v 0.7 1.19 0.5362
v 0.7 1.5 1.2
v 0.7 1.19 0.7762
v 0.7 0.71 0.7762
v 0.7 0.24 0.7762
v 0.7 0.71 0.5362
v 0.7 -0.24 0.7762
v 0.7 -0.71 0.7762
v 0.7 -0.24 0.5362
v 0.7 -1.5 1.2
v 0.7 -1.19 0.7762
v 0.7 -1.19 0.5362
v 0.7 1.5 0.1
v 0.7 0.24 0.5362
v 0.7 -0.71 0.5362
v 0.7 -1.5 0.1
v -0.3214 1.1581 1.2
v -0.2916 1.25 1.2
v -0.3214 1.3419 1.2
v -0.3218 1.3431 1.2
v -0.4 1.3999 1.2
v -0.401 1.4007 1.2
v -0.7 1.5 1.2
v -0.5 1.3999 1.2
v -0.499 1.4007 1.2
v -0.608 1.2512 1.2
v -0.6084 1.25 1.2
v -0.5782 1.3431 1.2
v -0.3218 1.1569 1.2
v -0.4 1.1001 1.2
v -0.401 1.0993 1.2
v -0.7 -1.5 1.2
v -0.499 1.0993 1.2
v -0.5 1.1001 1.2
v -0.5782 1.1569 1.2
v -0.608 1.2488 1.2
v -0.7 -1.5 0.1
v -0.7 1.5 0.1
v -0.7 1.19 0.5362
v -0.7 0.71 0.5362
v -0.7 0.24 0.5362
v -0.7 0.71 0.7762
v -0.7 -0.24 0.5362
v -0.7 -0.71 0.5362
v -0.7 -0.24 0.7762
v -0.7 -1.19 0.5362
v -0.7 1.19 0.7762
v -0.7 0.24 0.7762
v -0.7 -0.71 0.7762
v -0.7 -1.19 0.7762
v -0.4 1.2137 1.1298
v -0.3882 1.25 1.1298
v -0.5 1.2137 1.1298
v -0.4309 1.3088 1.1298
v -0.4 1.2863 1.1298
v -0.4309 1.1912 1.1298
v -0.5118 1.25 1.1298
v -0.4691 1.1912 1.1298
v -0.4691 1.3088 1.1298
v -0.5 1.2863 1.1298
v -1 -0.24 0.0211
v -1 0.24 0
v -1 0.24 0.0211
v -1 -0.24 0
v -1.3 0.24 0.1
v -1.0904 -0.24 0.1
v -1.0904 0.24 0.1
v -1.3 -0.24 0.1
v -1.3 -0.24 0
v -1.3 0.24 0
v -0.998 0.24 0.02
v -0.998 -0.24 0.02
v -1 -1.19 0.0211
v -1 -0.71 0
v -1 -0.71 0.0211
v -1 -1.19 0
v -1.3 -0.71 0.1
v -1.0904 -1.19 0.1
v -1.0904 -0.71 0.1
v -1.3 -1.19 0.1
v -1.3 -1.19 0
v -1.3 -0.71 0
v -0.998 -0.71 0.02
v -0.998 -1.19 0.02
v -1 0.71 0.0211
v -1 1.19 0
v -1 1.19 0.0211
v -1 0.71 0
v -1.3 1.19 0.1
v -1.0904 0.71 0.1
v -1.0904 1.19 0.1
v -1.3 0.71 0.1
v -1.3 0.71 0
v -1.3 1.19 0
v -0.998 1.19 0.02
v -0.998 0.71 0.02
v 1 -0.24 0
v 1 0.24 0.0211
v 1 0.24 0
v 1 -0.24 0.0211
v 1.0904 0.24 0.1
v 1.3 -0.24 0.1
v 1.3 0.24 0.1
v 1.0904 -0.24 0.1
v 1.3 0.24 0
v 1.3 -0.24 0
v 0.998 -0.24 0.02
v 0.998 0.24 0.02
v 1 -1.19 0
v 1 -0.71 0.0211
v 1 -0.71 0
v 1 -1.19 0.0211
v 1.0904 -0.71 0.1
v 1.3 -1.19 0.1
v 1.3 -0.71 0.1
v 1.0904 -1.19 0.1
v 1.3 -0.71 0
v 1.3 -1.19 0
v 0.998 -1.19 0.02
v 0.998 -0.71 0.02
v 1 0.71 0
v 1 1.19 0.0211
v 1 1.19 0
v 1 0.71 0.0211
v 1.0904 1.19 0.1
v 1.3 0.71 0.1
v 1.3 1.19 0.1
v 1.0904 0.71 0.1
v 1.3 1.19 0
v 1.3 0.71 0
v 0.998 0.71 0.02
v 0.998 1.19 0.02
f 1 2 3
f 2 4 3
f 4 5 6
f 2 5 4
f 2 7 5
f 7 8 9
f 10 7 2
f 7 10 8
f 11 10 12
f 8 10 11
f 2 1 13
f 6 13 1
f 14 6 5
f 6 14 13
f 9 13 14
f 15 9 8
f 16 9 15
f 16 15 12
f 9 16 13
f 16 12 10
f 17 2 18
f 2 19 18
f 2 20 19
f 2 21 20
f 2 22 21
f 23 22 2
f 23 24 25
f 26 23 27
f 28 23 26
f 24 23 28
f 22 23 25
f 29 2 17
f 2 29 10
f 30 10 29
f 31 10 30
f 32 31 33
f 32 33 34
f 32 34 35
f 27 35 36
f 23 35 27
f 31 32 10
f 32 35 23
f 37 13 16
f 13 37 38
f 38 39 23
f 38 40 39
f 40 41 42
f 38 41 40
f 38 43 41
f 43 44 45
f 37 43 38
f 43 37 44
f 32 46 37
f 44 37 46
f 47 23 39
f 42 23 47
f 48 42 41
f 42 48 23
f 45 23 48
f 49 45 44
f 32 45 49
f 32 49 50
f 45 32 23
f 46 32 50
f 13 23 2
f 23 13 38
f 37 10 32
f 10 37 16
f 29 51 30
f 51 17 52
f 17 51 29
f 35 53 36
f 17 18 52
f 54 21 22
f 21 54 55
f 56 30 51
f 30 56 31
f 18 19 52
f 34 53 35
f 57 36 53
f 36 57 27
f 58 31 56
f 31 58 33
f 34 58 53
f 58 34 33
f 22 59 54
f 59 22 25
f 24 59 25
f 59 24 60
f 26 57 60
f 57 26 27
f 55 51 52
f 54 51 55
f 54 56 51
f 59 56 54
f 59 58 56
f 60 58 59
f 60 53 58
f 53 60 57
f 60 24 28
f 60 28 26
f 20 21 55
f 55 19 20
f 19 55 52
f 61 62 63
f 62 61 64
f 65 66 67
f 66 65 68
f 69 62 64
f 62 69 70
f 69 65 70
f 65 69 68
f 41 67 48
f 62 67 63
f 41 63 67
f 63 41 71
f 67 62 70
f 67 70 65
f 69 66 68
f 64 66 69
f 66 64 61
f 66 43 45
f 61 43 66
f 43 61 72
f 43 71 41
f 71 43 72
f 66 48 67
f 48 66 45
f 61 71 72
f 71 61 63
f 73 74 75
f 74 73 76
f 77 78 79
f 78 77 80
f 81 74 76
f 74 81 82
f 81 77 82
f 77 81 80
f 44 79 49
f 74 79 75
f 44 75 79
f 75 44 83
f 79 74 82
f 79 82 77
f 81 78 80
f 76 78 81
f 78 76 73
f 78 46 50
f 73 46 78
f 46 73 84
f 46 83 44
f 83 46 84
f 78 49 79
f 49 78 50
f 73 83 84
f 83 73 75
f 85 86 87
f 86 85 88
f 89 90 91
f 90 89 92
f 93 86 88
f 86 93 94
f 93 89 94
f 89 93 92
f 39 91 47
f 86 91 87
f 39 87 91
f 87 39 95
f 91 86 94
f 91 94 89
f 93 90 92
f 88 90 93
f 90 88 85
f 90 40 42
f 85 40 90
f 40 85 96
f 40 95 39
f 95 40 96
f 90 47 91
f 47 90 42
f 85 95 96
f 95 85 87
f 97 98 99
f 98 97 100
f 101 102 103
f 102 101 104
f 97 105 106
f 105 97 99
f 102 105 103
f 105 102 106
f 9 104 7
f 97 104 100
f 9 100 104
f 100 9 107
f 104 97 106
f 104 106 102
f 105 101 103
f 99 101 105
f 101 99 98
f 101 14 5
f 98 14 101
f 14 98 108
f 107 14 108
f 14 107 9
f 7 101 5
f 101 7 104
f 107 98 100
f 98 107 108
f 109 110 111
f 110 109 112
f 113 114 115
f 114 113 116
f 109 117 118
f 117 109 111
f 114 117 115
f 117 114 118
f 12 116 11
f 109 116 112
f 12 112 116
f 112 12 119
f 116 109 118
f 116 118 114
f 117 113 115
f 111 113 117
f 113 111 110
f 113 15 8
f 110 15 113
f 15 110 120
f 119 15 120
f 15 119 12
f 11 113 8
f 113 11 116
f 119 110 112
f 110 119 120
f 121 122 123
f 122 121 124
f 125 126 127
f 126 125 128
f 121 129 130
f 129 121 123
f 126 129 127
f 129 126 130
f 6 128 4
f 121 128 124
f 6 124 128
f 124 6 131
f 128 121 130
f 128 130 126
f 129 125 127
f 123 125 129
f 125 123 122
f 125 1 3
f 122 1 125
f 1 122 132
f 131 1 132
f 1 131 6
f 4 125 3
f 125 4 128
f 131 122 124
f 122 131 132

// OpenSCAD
/*
 * A generic SOT-363 packaged part.
 *
 * Author: Ian McInerney
 * Created: June 25, 2013
 *
 */

module pin() {
	translate([0,0.0,0.0])cube([0.3,0.48,0.10], center=true);
	translate([0.1,0.0,0.0])rotate([0.0,30,0.0])translate([0.0,0.0,0.45])cube([0.12,0.48,0.9], center=true);
}


// Assemble the main package and the pins
module main() {
		translate([0.0,0.0,0.65])cube([1.4,3.0,1.1], center=true);
}

// Add the marker for pin 1
difference() {
	// The main cube
	main();

	// The pin 1 marker
	translate([-0.45,1.25,1.32])sphere(r=0.2, $fn=10);
}

translate([-1.15,0.0,0.05])pin();
translate([-1.15,-0.95,0.05])pin();
translate([-1.15,0.95,0.05])pin();

translate([1.15,0.0,0.05])rotate([0.0,0.0,180])pin();
translate([1.15,-0.95,0.05])rotate([0.0,0.0,180])pin();
translate([1.15,0.95,0.05])rotate([0.0,0.0,180])pin();
